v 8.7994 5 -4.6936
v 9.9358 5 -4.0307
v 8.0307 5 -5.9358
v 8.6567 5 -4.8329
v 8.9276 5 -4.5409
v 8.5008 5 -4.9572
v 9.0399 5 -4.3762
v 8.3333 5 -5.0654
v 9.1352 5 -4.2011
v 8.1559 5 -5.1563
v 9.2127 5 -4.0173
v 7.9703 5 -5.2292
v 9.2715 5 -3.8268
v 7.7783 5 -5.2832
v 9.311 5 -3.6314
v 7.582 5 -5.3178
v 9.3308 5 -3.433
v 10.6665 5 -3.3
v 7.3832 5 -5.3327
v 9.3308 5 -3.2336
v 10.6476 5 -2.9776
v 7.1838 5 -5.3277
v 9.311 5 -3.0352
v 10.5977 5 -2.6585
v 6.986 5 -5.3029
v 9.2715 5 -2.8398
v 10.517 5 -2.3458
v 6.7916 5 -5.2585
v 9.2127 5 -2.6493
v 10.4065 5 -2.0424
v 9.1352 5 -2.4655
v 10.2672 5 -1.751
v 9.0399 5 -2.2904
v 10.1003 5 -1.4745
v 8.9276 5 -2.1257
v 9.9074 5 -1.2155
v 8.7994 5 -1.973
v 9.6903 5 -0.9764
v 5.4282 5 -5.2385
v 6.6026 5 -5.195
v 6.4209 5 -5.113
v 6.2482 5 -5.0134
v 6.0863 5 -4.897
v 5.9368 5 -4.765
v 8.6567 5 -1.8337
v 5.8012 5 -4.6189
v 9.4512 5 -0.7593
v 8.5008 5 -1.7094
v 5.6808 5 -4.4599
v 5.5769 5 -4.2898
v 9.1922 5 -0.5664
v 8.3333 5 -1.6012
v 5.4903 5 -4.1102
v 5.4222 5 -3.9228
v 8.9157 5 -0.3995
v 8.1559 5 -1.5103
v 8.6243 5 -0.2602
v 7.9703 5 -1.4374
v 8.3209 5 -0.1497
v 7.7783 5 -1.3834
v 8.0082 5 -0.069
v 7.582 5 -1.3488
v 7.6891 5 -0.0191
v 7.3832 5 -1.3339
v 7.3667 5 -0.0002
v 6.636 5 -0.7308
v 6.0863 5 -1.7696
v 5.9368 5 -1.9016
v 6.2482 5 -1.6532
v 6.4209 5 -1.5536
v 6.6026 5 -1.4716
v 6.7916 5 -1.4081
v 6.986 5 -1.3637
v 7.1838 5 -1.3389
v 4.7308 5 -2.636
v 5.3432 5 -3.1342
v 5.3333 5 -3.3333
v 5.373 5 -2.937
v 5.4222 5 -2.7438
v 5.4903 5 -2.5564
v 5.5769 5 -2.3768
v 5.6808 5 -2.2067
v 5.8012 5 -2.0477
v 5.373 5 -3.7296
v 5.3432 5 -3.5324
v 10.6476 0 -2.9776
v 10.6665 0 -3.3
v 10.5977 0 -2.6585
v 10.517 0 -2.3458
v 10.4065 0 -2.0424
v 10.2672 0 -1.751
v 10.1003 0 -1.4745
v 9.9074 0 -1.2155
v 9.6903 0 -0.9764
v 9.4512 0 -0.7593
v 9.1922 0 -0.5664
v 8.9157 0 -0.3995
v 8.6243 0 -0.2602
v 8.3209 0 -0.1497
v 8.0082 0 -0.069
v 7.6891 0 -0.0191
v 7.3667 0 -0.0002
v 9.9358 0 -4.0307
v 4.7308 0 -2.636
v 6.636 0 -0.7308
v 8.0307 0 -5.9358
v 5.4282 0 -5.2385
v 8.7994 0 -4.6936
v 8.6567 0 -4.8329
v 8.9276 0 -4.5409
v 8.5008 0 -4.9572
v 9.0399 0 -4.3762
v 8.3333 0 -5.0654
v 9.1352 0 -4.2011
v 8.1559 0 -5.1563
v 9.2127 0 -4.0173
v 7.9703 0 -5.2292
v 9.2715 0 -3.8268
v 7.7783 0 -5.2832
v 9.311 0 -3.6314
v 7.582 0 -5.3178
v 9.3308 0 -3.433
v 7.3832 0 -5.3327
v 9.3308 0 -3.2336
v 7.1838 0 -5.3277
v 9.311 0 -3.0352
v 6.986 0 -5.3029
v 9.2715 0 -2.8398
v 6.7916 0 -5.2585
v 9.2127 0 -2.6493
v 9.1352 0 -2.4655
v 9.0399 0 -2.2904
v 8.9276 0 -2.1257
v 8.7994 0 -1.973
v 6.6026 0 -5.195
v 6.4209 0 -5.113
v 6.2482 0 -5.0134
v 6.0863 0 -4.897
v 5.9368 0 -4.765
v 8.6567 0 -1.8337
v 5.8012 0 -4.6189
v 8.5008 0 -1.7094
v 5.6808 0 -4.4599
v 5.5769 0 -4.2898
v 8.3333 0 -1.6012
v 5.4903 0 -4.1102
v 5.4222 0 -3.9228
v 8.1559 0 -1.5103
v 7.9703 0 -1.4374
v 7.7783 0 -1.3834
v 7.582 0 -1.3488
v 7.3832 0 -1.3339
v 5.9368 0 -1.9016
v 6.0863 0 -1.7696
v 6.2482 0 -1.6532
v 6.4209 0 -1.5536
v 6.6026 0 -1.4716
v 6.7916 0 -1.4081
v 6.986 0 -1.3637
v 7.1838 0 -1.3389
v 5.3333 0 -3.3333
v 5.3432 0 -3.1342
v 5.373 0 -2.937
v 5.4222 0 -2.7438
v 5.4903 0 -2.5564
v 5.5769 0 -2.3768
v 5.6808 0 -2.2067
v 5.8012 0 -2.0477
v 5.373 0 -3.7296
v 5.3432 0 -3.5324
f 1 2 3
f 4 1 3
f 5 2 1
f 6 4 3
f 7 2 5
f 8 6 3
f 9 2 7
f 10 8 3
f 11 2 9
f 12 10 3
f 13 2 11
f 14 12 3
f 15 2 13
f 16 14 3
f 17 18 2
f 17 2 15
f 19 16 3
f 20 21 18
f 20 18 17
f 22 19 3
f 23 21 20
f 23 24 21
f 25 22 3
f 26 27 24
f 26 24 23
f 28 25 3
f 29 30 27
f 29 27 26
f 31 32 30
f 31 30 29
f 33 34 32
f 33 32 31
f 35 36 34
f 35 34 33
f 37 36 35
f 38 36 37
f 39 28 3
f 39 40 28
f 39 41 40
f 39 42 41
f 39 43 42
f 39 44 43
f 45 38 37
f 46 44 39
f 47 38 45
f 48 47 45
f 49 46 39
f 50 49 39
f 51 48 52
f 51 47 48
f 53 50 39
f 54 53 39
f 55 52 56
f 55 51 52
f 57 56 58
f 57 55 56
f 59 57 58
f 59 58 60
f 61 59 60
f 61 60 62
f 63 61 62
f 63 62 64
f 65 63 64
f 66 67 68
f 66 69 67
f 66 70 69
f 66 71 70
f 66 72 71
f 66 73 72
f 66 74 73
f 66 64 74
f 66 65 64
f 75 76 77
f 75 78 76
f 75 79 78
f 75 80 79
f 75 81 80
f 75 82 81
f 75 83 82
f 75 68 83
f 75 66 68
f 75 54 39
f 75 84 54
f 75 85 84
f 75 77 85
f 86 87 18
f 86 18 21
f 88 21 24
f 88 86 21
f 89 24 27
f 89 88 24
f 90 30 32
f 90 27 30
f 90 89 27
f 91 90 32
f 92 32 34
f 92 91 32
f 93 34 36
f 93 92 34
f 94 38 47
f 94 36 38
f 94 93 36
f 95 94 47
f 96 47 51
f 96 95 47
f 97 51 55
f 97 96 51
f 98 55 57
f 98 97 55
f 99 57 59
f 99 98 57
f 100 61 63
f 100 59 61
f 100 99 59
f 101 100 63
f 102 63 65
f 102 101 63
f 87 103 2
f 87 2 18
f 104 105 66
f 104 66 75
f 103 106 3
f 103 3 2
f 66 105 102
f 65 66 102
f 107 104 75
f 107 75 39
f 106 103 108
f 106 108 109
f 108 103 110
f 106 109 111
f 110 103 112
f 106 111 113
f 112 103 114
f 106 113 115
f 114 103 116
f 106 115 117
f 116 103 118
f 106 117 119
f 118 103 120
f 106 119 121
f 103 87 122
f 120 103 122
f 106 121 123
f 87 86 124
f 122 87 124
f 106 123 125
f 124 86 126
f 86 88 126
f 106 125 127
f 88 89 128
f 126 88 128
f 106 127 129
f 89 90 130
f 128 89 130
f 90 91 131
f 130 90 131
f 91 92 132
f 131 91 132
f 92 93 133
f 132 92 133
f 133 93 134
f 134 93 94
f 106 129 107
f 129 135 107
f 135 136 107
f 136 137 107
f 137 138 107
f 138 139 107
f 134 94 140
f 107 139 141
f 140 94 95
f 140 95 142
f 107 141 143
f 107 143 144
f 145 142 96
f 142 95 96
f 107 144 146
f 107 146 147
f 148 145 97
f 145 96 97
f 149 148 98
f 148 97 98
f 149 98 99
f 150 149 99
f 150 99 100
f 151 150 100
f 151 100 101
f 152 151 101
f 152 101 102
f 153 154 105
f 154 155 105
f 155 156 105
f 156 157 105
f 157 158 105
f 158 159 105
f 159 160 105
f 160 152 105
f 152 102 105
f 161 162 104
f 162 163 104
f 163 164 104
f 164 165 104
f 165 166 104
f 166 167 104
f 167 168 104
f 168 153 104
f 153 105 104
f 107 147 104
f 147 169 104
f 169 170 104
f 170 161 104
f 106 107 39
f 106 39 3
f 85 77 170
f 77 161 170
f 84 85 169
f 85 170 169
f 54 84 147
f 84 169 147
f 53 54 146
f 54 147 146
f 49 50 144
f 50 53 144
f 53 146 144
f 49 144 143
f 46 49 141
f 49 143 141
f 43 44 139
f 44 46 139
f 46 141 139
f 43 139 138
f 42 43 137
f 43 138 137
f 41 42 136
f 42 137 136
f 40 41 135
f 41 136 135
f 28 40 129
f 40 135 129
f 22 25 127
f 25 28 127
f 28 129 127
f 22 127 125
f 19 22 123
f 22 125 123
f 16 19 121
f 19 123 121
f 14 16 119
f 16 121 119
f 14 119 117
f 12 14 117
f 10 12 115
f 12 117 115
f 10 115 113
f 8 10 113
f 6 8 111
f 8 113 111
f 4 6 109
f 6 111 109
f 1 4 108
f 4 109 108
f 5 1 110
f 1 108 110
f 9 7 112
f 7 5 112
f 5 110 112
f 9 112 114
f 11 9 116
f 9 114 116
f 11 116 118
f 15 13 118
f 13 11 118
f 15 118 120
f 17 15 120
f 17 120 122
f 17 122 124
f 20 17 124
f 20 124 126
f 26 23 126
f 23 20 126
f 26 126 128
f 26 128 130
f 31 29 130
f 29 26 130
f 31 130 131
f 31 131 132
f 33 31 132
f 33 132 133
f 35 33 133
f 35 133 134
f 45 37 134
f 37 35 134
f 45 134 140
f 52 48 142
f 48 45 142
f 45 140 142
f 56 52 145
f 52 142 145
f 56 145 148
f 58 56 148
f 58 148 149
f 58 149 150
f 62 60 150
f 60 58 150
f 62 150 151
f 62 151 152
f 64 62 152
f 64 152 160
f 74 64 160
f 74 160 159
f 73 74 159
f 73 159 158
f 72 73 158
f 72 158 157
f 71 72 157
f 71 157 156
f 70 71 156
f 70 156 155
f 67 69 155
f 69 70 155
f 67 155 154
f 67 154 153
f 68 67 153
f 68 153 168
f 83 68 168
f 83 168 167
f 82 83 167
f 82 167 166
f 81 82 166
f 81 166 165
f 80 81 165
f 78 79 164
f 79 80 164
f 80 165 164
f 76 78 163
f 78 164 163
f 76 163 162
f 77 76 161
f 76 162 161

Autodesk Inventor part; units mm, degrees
ref_plane "YZ Plane" through (0, 0, 0) normal (1, 0, 0) x (0, 1, 0)
ref_plane "XZ Plane" through (0, 0, 0) normal (0, 1, 0) x (-1, 0, 0)
ref_plane "XY Plane" through (0, 0, 0) normal (0, 0, 1) x (1, 0, 0)
sketch "Sketch1" plane through (0, 0, 0) normal (0, 1, 0) x (-1, 0, 0)
  arc A0 (-7.3333, 0) -> (-10.6667, -3.3333) centre (-7.3333, -3.3333) ccw
  arc A1 (-7.3333, 0) -> (-7.3667, -0.0002) centre (-7.3333, -3.3333) ccw
  line L0 (-5.4282, -5.2385) -> (-8.0307, -5.9358)
  line L1 (-8.0307, -5.9358) -> (-5.4282, -5.2385)
  line L2 (-8.0307, -5.9358) -> (-9.9358, -4.0307)
  line L3 (-6.636, -0.7308) -> (-4.7308, -2.636)
  line L4 (-4.7308, -2.636) -> (-5.4282, -5.2385)
  line L5 (-8.0307, -5.9358) -> (-9.9358, -4.0307)
  line L6 (-6.636, -0.7308) -> (-4.7308, -2.636)
  line L7 (-6.636, -0.7308) -> (-7.3667, -0.0002)
  line L8 (-9.9358, -4.0307) -> (-10.6665, -3.3)
  arc A2 (-10.6665, -3.3) -> (-10.6667, -3.3333) centre (-7.3333, -3.3333) ccw
  arc A3 (-7.3667, -0.0002) -> (-10.6665, -3.3) centre (-7.3333, -3.3333) ccw construction
  circle A4 centre (-7.3333, -3.3333) radius 2
  point P0 (0, 0)
  dimension "d2" = 4
extrude "Extrusion1" add sketch "Sketch1" along normal blind 5
properties part number "NutInserperFilling" material "Nylon 6/6"
